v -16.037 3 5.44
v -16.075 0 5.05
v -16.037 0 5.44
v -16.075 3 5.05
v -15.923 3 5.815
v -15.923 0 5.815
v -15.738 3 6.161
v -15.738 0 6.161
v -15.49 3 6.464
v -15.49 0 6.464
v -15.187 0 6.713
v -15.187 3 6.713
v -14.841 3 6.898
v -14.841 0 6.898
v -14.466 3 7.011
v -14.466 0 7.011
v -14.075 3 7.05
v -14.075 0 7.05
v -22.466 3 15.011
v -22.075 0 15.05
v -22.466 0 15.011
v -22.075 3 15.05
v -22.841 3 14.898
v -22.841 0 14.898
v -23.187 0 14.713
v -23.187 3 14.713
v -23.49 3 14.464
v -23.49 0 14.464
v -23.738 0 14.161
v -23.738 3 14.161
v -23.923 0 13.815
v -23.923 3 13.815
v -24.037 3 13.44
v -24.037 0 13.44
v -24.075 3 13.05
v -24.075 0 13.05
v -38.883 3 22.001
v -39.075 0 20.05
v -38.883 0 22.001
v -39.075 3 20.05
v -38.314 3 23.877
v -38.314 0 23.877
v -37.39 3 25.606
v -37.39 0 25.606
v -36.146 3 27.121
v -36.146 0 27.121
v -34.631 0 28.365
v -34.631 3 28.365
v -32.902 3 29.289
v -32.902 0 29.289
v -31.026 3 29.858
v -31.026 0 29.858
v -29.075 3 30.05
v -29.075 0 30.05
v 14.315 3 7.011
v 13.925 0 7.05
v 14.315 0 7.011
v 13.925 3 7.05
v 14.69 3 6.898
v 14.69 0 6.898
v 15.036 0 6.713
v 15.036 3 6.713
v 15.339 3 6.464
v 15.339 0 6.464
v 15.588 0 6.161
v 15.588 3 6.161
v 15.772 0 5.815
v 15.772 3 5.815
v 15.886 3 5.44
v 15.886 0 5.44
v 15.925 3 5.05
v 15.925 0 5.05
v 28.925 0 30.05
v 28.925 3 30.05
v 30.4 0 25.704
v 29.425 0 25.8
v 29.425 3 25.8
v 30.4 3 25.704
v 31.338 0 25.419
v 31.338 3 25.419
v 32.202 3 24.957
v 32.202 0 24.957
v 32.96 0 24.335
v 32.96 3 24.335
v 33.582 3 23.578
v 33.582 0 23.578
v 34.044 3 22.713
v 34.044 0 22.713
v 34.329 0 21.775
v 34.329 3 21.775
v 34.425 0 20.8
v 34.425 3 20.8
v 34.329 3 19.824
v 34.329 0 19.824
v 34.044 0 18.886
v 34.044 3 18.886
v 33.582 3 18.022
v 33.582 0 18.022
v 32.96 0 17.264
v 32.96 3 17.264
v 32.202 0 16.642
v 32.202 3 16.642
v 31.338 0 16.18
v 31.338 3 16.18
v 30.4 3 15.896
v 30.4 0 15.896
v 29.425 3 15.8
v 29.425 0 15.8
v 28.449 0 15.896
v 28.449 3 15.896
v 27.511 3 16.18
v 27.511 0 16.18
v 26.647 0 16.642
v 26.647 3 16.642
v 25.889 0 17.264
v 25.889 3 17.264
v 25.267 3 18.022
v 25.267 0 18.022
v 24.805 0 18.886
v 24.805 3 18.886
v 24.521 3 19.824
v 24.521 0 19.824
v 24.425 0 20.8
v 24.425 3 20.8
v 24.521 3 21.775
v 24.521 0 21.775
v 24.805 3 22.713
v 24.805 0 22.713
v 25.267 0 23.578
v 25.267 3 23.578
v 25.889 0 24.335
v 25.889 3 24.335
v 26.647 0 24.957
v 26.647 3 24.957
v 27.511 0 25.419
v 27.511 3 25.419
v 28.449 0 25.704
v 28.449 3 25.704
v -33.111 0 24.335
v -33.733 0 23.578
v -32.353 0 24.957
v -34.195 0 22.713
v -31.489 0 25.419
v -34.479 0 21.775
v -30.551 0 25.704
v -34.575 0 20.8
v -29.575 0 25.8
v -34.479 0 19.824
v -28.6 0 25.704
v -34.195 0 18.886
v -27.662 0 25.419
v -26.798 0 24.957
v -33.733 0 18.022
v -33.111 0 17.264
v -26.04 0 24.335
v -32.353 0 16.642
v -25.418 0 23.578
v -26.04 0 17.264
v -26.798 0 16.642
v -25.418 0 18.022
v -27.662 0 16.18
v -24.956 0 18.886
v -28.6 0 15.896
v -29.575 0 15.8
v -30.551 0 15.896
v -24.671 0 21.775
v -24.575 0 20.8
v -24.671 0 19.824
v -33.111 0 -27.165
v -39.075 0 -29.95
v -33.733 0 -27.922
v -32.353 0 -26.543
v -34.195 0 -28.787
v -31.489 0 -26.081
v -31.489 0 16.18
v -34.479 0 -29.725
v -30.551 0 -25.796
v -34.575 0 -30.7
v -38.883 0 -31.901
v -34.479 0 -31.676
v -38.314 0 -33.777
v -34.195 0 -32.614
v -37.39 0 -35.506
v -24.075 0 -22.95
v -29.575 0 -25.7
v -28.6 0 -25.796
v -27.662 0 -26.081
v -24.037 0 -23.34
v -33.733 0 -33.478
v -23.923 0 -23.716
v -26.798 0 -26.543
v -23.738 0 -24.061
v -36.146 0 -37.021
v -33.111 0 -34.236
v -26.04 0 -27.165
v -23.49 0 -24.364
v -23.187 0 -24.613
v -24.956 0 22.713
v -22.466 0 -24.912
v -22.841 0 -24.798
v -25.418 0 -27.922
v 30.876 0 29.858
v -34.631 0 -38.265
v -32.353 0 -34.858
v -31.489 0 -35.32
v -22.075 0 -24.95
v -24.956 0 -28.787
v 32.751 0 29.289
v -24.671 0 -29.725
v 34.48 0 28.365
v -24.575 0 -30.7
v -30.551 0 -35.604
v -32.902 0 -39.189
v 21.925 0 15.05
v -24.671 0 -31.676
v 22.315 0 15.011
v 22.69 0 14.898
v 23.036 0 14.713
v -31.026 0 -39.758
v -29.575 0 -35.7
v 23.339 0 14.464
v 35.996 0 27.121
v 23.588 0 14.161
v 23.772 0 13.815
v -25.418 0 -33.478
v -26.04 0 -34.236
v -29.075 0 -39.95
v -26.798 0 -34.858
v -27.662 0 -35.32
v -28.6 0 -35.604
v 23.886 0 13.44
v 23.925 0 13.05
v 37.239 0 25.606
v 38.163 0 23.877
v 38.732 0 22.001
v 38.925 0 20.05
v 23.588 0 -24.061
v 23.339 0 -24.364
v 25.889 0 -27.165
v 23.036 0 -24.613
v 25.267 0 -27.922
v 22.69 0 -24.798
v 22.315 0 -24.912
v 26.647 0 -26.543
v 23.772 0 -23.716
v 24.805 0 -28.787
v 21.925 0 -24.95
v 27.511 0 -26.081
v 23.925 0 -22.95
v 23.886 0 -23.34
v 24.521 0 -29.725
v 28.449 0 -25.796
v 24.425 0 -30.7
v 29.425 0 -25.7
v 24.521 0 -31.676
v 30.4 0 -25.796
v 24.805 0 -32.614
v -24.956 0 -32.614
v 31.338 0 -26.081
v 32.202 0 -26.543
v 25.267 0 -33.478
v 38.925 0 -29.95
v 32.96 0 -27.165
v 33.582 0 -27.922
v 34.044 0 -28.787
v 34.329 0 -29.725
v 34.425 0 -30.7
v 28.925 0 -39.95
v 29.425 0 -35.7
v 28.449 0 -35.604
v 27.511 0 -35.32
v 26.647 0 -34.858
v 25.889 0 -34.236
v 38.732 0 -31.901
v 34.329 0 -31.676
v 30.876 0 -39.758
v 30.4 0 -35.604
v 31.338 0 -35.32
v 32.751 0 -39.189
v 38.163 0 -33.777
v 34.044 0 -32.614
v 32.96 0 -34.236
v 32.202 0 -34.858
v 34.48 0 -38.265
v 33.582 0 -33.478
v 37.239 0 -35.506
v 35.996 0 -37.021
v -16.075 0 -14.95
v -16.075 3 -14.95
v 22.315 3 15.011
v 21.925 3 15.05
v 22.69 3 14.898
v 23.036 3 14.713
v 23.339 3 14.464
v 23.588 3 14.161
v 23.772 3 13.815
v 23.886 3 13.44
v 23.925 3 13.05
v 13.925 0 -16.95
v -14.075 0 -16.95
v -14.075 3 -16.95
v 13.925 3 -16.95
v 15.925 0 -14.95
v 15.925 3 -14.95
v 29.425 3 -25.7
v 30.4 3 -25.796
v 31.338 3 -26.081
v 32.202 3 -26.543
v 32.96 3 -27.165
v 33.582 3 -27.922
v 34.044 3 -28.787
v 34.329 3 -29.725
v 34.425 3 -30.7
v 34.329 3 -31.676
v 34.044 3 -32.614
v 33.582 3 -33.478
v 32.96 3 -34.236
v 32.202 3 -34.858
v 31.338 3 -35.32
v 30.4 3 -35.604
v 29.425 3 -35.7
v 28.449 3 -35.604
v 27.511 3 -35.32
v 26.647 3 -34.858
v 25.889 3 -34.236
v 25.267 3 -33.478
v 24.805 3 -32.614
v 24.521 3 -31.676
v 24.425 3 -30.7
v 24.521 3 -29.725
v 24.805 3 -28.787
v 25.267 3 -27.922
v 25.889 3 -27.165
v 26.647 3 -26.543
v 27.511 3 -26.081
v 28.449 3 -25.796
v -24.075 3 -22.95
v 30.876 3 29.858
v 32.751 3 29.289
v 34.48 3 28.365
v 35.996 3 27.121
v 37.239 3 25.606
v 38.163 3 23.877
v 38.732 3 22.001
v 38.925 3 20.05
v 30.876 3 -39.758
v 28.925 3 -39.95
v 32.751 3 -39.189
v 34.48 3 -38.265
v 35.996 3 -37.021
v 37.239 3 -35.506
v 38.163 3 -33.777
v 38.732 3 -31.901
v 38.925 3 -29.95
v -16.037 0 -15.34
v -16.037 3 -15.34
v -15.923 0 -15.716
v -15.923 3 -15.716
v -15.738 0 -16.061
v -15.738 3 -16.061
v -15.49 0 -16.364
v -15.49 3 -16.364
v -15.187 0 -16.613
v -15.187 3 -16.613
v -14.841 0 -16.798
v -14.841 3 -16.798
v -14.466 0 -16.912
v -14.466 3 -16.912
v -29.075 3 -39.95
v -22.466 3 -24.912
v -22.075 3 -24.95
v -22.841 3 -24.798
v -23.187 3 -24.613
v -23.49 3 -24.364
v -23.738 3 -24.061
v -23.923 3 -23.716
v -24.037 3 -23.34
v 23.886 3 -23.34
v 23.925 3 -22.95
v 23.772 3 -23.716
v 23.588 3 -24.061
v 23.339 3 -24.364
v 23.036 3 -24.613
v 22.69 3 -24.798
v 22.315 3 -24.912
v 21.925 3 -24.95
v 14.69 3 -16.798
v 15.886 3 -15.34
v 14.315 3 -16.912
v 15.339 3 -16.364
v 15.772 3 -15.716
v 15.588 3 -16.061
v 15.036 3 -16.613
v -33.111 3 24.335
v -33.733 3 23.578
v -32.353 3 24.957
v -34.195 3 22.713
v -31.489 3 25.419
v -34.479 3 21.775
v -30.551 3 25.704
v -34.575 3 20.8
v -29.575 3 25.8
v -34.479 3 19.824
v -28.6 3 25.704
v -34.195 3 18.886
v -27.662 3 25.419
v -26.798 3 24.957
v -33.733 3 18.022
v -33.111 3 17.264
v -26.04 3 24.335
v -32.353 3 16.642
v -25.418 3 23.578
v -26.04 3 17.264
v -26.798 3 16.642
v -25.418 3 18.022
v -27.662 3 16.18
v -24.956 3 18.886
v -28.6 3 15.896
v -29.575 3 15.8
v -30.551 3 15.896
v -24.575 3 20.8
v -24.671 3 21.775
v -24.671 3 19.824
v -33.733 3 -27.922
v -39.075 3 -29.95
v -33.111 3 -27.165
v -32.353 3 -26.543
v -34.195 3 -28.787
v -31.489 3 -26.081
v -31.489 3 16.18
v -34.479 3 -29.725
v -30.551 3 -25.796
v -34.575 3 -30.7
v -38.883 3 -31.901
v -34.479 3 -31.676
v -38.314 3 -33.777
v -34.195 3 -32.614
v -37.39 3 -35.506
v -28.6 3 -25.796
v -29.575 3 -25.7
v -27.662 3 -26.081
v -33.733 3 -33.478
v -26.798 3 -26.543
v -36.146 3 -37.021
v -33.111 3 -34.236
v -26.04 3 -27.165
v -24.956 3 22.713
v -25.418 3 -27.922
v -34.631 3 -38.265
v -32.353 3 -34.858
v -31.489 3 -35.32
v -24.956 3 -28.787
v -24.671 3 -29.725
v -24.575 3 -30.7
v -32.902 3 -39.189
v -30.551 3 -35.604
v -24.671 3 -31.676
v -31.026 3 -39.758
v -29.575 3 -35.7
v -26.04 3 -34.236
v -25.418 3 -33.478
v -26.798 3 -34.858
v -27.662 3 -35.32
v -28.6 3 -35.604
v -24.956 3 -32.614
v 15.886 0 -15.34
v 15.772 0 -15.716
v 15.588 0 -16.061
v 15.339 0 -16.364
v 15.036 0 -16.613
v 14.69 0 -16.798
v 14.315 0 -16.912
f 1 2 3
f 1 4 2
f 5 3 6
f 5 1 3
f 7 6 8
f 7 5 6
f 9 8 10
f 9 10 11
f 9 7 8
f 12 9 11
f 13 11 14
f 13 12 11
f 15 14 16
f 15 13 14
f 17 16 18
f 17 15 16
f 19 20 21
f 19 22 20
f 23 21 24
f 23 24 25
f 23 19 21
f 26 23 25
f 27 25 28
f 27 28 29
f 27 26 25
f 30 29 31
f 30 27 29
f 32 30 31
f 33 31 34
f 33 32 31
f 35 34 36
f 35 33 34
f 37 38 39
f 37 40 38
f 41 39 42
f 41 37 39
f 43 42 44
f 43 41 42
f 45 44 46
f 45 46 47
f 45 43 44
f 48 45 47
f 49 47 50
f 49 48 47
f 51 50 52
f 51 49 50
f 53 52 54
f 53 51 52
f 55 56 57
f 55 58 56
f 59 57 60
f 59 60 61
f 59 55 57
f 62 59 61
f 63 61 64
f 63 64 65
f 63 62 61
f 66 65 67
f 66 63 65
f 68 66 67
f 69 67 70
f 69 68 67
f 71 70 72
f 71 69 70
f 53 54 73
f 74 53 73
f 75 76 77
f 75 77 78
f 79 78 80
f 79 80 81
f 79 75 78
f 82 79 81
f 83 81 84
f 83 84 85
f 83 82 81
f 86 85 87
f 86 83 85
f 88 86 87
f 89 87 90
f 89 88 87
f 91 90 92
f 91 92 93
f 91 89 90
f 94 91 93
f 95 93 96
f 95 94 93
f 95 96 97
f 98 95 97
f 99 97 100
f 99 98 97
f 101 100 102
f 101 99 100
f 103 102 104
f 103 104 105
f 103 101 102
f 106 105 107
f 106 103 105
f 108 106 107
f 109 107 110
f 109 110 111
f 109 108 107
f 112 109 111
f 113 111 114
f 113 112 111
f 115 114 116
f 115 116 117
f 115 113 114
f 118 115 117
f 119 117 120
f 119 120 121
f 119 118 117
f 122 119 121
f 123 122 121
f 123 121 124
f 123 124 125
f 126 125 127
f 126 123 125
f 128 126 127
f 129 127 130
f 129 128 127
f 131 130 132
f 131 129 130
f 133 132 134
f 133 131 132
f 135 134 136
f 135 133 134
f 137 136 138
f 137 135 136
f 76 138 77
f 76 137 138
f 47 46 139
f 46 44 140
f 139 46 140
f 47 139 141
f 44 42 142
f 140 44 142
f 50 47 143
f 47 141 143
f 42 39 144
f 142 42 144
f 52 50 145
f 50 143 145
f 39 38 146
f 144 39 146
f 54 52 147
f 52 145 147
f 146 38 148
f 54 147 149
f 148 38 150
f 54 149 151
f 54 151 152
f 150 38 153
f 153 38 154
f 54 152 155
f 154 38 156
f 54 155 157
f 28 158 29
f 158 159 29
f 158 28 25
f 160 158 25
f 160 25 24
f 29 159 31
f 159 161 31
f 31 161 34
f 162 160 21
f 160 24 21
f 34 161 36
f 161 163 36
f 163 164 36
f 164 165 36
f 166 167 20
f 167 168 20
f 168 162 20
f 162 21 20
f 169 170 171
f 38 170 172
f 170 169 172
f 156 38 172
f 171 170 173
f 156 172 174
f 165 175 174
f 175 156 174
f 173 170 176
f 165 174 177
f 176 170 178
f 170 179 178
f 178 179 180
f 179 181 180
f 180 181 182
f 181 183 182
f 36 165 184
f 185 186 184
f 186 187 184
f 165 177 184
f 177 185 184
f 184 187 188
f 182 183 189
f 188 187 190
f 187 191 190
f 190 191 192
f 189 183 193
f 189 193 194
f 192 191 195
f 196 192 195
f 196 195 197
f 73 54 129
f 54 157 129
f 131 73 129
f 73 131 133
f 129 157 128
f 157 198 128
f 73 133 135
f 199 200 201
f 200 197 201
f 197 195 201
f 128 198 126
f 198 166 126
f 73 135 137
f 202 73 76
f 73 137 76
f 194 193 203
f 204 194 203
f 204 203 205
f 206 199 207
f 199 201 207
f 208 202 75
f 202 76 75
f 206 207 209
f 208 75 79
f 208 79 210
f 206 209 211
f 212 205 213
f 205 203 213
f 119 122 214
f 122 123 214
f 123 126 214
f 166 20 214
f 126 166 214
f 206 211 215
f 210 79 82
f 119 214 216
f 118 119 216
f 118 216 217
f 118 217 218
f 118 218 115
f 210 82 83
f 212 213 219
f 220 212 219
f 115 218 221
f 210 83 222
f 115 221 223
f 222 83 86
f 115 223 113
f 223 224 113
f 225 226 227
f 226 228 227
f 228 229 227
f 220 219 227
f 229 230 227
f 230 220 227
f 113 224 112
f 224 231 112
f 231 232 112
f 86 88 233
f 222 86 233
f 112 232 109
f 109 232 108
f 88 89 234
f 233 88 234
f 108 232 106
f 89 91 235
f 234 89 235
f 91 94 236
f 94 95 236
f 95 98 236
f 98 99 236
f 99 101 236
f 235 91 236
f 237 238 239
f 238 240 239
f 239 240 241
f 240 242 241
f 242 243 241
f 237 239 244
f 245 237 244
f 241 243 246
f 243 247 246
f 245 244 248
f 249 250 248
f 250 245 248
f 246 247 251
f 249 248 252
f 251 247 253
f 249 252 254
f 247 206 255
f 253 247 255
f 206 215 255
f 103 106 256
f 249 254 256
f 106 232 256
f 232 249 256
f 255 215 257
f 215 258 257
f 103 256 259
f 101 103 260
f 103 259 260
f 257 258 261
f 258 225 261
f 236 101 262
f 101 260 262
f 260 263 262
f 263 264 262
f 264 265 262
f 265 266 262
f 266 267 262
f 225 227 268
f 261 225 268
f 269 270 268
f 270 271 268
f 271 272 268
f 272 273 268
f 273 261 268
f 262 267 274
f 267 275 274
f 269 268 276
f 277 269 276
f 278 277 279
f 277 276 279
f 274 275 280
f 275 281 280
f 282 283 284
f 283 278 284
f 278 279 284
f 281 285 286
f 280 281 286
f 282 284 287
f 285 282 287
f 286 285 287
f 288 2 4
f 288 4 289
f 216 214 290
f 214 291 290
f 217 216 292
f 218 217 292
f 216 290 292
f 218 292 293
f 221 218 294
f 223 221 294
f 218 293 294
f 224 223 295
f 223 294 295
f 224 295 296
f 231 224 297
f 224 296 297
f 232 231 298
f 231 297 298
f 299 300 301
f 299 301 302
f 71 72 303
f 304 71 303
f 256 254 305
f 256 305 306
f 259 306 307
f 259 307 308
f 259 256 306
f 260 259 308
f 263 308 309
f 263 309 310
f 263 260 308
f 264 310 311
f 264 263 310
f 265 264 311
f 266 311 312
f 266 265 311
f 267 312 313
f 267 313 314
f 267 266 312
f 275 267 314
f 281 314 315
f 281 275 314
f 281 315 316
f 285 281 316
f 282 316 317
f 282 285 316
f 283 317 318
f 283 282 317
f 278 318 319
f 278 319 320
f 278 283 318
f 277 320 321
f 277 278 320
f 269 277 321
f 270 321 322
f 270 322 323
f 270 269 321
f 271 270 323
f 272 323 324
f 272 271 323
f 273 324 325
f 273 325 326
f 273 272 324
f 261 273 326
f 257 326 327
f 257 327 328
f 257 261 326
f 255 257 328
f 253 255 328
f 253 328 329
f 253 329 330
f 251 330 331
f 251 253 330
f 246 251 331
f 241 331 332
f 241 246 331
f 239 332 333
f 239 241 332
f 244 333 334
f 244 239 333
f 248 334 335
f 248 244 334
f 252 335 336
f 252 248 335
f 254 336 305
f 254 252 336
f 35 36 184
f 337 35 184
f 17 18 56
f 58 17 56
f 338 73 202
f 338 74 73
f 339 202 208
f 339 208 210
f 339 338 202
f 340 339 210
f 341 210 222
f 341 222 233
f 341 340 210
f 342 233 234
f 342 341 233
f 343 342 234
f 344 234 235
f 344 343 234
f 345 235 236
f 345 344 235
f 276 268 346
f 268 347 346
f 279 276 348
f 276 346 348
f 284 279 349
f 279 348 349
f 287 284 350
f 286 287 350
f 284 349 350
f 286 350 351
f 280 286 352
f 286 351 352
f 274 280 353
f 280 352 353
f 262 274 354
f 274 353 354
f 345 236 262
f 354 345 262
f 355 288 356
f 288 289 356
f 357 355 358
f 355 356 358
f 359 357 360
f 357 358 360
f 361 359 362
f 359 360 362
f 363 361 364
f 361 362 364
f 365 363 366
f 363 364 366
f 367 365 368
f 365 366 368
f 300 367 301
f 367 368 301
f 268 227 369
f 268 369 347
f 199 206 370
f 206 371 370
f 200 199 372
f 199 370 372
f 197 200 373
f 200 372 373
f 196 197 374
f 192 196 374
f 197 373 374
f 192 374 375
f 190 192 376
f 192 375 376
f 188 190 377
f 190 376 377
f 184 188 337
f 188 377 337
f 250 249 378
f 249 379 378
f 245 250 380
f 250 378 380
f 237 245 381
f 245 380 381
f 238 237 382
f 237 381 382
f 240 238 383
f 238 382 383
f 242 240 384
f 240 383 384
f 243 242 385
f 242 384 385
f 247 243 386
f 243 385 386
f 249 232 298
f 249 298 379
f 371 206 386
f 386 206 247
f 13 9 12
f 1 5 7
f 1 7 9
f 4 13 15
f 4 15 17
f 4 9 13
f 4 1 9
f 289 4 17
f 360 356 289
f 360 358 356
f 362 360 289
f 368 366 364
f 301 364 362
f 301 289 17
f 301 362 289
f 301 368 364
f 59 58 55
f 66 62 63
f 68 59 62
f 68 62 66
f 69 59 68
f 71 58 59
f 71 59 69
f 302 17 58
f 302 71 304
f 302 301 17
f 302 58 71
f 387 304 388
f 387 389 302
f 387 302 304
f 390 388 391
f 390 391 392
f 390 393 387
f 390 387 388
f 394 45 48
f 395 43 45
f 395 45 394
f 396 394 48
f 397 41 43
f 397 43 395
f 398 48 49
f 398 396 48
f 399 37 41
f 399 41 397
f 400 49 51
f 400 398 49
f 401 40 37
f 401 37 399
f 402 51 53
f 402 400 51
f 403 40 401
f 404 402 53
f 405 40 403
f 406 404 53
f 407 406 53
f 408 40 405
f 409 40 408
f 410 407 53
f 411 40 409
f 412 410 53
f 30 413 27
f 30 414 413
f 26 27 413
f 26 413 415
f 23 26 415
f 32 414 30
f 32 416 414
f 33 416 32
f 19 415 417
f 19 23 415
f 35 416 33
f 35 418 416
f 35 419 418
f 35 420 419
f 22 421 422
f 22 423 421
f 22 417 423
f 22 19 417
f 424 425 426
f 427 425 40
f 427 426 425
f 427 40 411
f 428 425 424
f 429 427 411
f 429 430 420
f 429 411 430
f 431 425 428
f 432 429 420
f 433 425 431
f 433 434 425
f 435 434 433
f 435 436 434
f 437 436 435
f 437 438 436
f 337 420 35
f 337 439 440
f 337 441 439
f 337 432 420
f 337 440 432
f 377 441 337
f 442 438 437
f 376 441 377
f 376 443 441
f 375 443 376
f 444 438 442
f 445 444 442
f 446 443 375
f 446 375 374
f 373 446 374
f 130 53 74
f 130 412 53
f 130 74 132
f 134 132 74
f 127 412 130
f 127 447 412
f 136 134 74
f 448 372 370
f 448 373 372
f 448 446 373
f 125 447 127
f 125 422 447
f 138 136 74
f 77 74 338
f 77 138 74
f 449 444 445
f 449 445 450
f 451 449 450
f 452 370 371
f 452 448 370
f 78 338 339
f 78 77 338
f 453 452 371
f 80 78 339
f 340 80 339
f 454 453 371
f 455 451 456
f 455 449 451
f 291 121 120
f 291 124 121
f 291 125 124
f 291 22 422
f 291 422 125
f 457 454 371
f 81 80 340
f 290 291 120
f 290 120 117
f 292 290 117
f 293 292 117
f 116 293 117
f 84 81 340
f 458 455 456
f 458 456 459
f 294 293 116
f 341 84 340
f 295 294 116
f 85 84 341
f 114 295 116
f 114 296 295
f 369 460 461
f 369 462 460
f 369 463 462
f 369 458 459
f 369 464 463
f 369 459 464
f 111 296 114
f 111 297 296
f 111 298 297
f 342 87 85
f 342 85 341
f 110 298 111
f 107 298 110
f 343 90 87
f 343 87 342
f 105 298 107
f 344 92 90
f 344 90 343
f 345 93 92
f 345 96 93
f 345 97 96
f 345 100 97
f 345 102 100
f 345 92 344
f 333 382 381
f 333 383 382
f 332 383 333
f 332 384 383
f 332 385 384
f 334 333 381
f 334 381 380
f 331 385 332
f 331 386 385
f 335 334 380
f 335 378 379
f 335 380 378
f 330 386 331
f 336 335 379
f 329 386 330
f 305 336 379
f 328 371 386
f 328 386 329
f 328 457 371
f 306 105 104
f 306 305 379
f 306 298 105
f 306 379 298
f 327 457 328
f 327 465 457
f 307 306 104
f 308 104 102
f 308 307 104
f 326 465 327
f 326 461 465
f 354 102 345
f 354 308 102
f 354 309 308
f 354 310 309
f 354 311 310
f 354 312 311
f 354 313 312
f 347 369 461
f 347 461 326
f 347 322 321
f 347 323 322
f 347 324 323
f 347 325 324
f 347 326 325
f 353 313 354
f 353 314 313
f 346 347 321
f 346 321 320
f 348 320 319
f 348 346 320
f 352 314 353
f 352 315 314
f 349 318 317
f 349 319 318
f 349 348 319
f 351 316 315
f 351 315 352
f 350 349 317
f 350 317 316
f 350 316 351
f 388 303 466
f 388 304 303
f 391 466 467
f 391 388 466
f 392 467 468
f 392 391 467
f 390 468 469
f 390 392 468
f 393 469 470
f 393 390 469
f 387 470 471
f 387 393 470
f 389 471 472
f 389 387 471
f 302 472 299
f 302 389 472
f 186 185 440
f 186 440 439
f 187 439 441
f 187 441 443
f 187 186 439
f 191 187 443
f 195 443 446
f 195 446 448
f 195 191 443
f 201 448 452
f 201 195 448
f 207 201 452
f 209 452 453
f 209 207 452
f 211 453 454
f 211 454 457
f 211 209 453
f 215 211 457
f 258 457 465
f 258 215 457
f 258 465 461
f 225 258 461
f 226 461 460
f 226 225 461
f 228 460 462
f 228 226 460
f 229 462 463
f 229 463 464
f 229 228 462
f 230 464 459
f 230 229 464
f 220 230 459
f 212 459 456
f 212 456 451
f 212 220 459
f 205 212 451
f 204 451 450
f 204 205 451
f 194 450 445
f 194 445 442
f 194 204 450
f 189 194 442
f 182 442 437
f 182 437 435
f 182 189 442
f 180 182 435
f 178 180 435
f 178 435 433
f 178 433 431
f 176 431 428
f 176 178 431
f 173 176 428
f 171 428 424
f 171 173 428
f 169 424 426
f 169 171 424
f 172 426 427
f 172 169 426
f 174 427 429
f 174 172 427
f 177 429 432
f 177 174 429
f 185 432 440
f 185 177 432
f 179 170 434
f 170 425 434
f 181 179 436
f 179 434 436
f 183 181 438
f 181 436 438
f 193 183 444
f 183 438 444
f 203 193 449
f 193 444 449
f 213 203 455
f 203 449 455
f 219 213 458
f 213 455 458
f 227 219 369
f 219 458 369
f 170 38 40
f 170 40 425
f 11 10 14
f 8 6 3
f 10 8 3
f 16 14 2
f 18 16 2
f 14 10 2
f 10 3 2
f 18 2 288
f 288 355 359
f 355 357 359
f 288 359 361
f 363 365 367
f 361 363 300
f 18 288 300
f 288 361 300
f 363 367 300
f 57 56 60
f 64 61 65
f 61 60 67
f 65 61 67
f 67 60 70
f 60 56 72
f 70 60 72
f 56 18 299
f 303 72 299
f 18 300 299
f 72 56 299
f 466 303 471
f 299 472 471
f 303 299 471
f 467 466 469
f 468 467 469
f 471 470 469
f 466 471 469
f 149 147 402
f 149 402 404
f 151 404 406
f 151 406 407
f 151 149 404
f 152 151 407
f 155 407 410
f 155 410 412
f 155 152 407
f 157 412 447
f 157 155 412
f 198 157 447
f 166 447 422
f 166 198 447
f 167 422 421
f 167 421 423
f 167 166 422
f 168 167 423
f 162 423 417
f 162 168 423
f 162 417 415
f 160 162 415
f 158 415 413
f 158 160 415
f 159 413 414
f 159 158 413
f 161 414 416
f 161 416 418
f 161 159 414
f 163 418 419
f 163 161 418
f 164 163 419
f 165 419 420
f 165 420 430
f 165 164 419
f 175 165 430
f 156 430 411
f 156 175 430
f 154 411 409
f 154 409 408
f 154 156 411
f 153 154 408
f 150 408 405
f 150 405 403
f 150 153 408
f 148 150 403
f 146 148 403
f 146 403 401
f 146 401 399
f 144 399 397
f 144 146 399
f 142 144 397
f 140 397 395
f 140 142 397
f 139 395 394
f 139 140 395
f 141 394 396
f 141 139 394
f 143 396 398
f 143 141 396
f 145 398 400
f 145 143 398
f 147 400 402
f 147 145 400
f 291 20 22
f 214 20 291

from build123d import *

# Parameters (mm, degrees)
SKETCH1_W             = 32
SKETCH1_H             = 24
BOSS_EXTRUDE1_DEPTH   = 3
SKETCH1_W_2           = 78
SKETCH1_H_2           = 70
SKETCH1_R             = 5
SKETCH1_W_3           = 48
SKETCH1_H_3           = 40
BOSS_EXTRUDE1_2_DEPTH = 3
FILLET1_R             = 2
FILLET2_R             = 10
FILLET3_R             = 2


with BuildPart() as part:
    # Sketch1 → Boss-Extrude1 (new body)
    with BuildSketch(Plane(origin=(0, 0, 0), x_dir=(1, 0, 0), z_dir=(0, 1, 0))):
        with Locations((-0.075399098, 4.950190099)):
            Rectangle(SKETCH1_W, SKETCH1_H)
    extrude(amount=BOSS_EXTRUDE1_DEPTH)

    # Fillet3
    fillet3_edges = [part.edges().sort_by_distance(p)[0] for p in [
        (15.924600902, 1.5, -16.950190099),
        (15.924600902, 1.5, 7.049809901),
        (-16.075399098, 1.5, 7.049809901),
        (-16.075399098, 1.5, -16.950190099),
    ]]
    fillet(fillet3_edges, radius=FILLET3_R)


with BuildPart() as body_2:
    # Sketch1 → Boss-Extrude1 2 (new body)
    with BuildSketch(Plane(origin=(0, 0, 0), x_dir=(1, 0, 0), z_dir=(0, 1, 0))):
        with Locations((-0.075399098, 4.950190099)):
            Rectangle(SKETCH1_W_2, SKETCH1_H_2)
        with Locations(Location((-29.575399098, -20.799809901, 0), (0, 0, 270))):
            Circle(SKETCH1_R, mode=Mode.SUBTRACT)
        with Locations(Location((-29.575399098, 30.700190099, 0), (0, 0, 270))):
            Circle(SKETCH1_R, mode=Mode.SUBTRACT)
        with Locations(Location((29.424600902, 30.700190099, 0), (0, 0, 270))):
            Circle(SKETCH1_R, mode=Mode.SUBTRACT)
        with Locations(Location((29.424600902, -20.799809901, 0), (0, 0, 270))):
            Circle(SKETCH1_R, mode=Mode.SUBTRACT)
        with Locations((-0.075399098, 4.950190099)):
            Rectangle(SKETCH1_W_3, SKETCH1_H_3, mode=Mode.SUBTRACT)
    extrude(amount=BOSS_EXTRUDE1_2_DEPTH)

    # Fillet1
    fillet1_edges = [body_2.edges().sort_by_distance(p)[0] for p in [
        (-24.075399098, 1.5, -24.950190099),
        (-24.075399098, 1.5, 15.049809901),
        (23.924600902, 1.5, 15.049809901),
        (23.924600902, 1.5, -24.950190099),
    ]]
    fillet(fillet1_edges, radius=FILLET1_R)

    # Fillet2
    fillet2_edges = [body_2.edges().sort_by_distance(p)[0] for p in [
        (38.924600902, 1.5, 30.049809901),
        (-39.075399098, 1.5, 30.049809901),
        (-39.075399098, 1.5, -39.950190099),
        (38.924600902, 1.5, -39.950190099),
    ]]
    fillet(fillet2_edges, radius=FILLET2_R)


solid = Compound([part.part, body_2.part])
